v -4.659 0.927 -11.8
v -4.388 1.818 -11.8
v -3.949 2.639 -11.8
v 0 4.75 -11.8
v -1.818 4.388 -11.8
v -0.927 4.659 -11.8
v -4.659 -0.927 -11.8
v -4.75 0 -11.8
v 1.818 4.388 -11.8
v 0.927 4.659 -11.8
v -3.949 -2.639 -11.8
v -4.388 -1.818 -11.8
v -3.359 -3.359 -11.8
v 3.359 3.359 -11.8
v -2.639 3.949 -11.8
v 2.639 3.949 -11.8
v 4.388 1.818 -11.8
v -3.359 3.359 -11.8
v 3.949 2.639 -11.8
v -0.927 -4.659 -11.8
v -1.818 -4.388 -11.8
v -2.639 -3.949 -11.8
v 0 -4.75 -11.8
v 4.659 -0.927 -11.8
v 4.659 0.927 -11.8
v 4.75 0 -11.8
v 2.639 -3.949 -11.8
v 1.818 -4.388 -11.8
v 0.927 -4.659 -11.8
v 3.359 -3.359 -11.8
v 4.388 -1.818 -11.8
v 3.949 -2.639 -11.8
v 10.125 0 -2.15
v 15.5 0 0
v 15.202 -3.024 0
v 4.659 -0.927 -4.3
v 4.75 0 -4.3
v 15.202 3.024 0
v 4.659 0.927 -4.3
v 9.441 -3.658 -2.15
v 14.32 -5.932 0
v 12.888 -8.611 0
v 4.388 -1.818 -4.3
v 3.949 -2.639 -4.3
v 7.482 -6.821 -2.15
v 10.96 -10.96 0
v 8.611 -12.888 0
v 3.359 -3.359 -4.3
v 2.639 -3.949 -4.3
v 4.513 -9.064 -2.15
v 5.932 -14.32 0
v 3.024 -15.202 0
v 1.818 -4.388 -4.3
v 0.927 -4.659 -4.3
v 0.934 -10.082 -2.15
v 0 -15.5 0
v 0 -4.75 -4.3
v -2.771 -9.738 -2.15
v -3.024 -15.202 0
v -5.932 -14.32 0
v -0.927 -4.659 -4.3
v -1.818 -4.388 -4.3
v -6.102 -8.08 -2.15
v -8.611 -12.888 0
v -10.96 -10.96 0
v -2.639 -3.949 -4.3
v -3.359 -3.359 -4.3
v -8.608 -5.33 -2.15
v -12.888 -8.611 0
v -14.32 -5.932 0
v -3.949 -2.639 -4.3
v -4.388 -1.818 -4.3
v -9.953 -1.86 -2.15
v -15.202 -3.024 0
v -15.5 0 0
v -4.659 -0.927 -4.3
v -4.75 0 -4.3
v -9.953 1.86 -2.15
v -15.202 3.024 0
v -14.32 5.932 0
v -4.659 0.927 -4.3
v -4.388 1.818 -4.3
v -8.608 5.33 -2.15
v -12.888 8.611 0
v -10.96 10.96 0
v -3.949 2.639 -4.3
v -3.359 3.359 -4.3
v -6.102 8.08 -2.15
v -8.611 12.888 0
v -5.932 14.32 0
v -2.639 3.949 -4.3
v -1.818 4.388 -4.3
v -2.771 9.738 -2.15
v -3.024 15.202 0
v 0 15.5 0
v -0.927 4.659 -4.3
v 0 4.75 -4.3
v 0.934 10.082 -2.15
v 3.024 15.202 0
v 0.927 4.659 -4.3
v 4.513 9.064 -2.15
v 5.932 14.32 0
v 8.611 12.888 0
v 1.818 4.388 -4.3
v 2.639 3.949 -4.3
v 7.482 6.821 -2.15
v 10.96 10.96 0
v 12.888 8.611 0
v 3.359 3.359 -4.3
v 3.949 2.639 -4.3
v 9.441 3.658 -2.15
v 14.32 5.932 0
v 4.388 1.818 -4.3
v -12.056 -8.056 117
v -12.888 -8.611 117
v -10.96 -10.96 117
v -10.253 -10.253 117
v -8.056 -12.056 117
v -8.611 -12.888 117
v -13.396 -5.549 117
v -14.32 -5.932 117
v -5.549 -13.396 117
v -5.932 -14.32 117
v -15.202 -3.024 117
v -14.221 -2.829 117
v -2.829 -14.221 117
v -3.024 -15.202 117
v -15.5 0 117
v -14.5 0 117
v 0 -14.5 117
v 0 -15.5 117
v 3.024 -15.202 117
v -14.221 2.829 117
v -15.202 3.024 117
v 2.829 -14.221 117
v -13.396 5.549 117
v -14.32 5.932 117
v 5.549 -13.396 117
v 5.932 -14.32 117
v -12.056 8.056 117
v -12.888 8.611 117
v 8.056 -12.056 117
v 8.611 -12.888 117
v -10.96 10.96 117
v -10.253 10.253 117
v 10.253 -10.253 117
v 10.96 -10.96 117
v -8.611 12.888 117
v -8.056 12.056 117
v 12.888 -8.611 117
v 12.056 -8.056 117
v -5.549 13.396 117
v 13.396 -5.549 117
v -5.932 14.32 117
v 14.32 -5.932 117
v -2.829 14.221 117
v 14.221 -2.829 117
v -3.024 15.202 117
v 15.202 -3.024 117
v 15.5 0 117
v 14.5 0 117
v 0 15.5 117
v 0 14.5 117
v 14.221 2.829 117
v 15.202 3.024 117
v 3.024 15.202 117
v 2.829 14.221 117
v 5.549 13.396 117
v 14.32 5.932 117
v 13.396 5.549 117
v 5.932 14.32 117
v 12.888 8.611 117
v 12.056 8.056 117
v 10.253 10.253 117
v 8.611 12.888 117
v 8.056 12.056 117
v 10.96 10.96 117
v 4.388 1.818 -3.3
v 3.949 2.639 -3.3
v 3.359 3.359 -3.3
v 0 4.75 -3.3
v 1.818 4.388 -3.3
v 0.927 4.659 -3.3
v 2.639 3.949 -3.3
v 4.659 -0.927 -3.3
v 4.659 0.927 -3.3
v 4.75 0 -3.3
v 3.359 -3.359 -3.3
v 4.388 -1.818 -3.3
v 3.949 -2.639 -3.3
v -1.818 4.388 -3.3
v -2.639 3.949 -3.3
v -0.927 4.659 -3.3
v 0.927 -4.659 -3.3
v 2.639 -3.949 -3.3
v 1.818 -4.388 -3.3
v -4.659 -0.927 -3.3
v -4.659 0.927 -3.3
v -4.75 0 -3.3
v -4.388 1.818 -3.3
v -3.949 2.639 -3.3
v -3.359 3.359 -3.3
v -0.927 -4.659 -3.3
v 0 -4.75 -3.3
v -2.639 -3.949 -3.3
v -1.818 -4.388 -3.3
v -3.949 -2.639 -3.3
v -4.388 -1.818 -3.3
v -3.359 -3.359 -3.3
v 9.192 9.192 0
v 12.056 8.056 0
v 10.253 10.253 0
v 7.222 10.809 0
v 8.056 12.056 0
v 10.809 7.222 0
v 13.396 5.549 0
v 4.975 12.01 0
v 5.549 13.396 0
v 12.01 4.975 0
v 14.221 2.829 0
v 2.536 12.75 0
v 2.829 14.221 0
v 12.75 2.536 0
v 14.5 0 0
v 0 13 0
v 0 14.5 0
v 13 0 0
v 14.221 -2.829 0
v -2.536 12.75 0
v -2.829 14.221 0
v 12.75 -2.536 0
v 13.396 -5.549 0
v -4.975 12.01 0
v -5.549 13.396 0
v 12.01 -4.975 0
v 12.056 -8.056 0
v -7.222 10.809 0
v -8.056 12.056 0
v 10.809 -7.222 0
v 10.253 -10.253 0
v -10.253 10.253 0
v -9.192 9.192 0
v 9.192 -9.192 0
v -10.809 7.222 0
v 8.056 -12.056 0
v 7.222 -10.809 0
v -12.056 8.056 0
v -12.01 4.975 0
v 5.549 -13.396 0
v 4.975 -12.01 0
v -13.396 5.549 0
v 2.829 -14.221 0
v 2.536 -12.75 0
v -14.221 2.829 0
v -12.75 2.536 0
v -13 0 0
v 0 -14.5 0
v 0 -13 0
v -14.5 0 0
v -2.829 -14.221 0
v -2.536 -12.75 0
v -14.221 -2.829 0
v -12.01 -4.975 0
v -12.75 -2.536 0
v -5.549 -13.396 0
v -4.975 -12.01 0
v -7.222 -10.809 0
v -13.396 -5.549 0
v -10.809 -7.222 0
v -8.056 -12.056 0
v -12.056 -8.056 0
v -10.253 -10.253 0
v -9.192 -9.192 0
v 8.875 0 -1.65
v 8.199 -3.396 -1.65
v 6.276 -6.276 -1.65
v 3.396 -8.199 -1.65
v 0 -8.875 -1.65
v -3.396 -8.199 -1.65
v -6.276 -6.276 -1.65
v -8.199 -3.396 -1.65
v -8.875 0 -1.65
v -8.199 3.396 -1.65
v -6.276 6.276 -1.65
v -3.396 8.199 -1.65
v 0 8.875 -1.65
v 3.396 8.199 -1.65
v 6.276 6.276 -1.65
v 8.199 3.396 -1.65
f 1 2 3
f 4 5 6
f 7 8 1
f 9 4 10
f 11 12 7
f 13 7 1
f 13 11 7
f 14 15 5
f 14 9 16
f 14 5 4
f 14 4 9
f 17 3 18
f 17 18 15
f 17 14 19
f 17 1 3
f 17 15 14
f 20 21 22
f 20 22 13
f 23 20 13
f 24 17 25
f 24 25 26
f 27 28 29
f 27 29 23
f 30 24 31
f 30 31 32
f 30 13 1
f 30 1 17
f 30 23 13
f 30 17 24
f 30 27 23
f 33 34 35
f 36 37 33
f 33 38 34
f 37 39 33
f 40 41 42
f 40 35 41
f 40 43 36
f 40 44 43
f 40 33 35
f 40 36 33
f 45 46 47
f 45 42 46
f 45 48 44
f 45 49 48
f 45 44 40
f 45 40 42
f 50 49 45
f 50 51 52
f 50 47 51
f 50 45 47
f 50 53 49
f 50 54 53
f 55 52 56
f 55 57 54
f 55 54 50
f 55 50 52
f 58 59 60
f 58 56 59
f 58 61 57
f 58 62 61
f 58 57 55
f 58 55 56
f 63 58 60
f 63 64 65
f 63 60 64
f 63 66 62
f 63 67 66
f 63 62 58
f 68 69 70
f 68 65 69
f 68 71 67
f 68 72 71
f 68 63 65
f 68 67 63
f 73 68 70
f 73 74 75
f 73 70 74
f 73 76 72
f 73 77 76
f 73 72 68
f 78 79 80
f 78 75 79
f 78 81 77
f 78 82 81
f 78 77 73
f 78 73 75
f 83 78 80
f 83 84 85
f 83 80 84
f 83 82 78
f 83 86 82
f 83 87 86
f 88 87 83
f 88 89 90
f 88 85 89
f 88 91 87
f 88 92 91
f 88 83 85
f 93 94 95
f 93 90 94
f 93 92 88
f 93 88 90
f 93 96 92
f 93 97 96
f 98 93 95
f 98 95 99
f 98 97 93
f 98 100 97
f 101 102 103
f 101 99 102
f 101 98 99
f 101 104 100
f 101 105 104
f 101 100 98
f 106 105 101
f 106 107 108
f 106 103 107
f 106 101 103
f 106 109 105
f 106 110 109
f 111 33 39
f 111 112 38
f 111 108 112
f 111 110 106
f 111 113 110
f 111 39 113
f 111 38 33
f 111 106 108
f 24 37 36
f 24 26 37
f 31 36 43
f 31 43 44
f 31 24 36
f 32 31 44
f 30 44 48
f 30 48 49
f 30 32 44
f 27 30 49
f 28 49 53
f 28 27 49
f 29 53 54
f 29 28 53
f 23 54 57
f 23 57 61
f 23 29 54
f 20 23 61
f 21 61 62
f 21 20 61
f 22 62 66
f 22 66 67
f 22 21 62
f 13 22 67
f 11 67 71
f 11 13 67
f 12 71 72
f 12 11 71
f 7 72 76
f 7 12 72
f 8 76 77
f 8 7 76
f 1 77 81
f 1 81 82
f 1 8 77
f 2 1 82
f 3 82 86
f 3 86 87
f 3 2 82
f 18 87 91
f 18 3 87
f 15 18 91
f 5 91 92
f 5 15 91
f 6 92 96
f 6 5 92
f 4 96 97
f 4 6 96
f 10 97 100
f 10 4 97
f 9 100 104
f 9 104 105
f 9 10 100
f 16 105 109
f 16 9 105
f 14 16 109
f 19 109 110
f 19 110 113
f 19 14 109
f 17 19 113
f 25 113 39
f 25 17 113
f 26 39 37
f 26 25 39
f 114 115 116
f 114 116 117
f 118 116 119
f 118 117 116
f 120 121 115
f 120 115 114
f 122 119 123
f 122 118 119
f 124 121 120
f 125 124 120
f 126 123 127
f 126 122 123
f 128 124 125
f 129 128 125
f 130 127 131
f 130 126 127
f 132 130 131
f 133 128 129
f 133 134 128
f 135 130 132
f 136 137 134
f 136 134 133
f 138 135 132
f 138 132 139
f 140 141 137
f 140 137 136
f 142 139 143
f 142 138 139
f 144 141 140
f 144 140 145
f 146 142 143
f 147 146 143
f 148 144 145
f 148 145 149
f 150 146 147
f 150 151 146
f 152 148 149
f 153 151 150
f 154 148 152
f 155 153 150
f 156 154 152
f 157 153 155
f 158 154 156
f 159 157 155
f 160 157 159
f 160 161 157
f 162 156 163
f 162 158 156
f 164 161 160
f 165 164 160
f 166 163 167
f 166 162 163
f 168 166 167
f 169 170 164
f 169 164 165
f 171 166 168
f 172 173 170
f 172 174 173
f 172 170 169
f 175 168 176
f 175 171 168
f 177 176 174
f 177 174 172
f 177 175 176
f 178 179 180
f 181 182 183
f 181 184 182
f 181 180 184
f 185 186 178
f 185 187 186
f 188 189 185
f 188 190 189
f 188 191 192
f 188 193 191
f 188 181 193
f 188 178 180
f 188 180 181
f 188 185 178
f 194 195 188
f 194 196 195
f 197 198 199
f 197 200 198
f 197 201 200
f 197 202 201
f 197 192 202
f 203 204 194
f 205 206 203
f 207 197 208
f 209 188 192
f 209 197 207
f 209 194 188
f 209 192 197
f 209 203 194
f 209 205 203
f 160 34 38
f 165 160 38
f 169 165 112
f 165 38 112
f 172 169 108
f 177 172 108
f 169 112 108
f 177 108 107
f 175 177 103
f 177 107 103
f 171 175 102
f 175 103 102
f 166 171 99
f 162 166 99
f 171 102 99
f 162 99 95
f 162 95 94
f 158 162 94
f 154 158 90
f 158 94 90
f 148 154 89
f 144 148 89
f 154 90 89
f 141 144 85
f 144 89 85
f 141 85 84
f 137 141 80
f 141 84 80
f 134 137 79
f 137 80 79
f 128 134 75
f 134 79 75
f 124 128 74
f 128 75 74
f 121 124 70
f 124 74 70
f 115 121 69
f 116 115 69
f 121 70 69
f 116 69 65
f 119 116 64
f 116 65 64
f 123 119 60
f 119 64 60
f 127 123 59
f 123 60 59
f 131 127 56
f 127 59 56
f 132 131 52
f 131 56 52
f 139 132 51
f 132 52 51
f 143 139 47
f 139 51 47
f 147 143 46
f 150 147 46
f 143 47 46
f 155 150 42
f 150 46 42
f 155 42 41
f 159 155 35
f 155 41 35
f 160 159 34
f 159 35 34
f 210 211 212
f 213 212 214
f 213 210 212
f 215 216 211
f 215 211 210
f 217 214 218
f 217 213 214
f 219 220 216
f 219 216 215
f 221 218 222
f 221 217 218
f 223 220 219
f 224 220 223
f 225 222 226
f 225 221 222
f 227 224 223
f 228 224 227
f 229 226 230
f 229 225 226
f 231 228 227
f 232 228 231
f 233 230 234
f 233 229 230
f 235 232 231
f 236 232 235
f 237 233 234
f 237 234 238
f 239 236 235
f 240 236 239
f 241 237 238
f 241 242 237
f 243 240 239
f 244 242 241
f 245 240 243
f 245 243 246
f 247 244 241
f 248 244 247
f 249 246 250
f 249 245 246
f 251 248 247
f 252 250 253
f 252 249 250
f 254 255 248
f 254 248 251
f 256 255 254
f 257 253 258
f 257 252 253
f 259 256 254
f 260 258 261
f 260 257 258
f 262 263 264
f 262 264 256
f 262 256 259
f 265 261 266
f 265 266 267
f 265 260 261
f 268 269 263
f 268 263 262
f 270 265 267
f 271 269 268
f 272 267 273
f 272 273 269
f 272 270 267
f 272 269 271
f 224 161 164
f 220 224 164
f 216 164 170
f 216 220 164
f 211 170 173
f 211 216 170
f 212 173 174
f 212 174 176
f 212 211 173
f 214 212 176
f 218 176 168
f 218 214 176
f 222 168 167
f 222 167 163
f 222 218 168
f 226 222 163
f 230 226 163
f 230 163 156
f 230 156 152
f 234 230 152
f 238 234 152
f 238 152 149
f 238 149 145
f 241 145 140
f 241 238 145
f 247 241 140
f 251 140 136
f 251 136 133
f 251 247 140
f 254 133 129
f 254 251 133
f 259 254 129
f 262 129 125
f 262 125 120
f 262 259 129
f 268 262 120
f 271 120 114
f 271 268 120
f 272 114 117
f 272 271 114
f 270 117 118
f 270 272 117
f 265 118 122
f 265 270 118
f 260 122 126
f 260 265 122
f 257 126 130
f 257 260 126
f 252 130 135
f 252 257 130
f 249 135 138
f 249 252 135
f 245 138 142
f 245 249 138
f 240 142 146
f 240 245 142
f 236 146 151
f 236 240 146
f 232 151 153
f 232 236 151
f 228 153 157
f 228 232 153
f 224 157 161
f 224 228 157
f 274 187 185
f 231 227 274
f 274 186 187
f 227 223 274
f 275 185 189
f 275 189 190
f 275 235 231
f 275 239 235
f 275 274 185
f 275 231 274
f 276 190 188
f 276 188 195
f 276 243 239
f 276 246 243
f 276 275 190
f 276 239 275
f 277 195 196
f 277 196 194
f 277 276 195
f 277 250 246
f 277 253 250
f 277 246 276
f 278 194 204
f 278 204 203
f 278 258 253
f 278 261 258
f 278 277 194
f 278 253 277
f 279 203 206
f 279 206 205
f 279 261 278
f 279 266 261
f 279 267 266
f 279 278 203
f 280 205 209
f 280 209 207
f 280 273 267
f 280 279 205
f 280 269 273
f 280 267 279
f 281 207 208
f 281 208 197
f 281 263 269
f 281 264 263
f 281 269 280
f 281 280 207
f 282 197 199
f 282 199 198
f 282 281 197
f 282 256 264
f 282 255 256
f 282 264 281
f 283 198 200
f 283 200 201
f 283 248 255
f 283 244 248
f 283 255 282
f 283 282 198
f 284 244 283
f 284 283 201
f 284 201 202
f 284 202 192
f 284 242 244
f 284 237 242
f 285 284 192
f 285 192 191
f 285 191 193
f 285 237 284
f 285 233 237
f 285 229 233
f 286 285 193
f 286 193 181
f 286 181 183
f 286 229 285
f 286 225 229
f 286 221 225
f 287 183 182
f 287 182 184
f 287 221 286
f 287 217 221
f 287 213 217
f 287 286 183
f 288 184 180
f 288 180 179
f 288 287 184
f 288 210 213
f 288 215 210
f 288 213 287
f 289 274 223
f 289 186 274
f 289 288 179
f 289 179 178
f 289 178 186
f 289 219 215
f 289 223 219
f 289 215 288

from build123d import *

# Parameters (mm, degrees)
SKETCH1_R           = 15.5
SKETCH1_R_2         = 14.5
BOSS_EXTRUDE1_DEPTH = 117


with BuildPart() as part:
    # Sketch1 → Boss-Extrude1 (new body)
    with BuildSketch(Plane.XY):
        Circle(SKETCH1_R)
        Circle(SKETCH1_R_2, mode=Mode.SUBTRACT)
    extrude(amount=BOSS_EXTRUDE1_DEPTH)

    # Sketch4 → Revolve1 (revolve)
    with BuildSketch(Plane(origin=(0, 0, 0), x_dir=(0, 0, -1), z_dir=(1, 0, 0)), mode=Mode.PRIVATE) as revolve1_sk:
        Polygon((0, -15.5), (4.3, -4.75), (11.8, -4.75), (11.8, 0), (4.3, 0), (3.3, 0), (3.3, -4.75), (0, -13), align=None)
    revolve(revolve1_sk.sketch.rotate(Axis((0, 0, 0), (0, 0, -1)), 270), axis=Axis((0, 0, 0), (0, 0, -1)))


solid = part.part
